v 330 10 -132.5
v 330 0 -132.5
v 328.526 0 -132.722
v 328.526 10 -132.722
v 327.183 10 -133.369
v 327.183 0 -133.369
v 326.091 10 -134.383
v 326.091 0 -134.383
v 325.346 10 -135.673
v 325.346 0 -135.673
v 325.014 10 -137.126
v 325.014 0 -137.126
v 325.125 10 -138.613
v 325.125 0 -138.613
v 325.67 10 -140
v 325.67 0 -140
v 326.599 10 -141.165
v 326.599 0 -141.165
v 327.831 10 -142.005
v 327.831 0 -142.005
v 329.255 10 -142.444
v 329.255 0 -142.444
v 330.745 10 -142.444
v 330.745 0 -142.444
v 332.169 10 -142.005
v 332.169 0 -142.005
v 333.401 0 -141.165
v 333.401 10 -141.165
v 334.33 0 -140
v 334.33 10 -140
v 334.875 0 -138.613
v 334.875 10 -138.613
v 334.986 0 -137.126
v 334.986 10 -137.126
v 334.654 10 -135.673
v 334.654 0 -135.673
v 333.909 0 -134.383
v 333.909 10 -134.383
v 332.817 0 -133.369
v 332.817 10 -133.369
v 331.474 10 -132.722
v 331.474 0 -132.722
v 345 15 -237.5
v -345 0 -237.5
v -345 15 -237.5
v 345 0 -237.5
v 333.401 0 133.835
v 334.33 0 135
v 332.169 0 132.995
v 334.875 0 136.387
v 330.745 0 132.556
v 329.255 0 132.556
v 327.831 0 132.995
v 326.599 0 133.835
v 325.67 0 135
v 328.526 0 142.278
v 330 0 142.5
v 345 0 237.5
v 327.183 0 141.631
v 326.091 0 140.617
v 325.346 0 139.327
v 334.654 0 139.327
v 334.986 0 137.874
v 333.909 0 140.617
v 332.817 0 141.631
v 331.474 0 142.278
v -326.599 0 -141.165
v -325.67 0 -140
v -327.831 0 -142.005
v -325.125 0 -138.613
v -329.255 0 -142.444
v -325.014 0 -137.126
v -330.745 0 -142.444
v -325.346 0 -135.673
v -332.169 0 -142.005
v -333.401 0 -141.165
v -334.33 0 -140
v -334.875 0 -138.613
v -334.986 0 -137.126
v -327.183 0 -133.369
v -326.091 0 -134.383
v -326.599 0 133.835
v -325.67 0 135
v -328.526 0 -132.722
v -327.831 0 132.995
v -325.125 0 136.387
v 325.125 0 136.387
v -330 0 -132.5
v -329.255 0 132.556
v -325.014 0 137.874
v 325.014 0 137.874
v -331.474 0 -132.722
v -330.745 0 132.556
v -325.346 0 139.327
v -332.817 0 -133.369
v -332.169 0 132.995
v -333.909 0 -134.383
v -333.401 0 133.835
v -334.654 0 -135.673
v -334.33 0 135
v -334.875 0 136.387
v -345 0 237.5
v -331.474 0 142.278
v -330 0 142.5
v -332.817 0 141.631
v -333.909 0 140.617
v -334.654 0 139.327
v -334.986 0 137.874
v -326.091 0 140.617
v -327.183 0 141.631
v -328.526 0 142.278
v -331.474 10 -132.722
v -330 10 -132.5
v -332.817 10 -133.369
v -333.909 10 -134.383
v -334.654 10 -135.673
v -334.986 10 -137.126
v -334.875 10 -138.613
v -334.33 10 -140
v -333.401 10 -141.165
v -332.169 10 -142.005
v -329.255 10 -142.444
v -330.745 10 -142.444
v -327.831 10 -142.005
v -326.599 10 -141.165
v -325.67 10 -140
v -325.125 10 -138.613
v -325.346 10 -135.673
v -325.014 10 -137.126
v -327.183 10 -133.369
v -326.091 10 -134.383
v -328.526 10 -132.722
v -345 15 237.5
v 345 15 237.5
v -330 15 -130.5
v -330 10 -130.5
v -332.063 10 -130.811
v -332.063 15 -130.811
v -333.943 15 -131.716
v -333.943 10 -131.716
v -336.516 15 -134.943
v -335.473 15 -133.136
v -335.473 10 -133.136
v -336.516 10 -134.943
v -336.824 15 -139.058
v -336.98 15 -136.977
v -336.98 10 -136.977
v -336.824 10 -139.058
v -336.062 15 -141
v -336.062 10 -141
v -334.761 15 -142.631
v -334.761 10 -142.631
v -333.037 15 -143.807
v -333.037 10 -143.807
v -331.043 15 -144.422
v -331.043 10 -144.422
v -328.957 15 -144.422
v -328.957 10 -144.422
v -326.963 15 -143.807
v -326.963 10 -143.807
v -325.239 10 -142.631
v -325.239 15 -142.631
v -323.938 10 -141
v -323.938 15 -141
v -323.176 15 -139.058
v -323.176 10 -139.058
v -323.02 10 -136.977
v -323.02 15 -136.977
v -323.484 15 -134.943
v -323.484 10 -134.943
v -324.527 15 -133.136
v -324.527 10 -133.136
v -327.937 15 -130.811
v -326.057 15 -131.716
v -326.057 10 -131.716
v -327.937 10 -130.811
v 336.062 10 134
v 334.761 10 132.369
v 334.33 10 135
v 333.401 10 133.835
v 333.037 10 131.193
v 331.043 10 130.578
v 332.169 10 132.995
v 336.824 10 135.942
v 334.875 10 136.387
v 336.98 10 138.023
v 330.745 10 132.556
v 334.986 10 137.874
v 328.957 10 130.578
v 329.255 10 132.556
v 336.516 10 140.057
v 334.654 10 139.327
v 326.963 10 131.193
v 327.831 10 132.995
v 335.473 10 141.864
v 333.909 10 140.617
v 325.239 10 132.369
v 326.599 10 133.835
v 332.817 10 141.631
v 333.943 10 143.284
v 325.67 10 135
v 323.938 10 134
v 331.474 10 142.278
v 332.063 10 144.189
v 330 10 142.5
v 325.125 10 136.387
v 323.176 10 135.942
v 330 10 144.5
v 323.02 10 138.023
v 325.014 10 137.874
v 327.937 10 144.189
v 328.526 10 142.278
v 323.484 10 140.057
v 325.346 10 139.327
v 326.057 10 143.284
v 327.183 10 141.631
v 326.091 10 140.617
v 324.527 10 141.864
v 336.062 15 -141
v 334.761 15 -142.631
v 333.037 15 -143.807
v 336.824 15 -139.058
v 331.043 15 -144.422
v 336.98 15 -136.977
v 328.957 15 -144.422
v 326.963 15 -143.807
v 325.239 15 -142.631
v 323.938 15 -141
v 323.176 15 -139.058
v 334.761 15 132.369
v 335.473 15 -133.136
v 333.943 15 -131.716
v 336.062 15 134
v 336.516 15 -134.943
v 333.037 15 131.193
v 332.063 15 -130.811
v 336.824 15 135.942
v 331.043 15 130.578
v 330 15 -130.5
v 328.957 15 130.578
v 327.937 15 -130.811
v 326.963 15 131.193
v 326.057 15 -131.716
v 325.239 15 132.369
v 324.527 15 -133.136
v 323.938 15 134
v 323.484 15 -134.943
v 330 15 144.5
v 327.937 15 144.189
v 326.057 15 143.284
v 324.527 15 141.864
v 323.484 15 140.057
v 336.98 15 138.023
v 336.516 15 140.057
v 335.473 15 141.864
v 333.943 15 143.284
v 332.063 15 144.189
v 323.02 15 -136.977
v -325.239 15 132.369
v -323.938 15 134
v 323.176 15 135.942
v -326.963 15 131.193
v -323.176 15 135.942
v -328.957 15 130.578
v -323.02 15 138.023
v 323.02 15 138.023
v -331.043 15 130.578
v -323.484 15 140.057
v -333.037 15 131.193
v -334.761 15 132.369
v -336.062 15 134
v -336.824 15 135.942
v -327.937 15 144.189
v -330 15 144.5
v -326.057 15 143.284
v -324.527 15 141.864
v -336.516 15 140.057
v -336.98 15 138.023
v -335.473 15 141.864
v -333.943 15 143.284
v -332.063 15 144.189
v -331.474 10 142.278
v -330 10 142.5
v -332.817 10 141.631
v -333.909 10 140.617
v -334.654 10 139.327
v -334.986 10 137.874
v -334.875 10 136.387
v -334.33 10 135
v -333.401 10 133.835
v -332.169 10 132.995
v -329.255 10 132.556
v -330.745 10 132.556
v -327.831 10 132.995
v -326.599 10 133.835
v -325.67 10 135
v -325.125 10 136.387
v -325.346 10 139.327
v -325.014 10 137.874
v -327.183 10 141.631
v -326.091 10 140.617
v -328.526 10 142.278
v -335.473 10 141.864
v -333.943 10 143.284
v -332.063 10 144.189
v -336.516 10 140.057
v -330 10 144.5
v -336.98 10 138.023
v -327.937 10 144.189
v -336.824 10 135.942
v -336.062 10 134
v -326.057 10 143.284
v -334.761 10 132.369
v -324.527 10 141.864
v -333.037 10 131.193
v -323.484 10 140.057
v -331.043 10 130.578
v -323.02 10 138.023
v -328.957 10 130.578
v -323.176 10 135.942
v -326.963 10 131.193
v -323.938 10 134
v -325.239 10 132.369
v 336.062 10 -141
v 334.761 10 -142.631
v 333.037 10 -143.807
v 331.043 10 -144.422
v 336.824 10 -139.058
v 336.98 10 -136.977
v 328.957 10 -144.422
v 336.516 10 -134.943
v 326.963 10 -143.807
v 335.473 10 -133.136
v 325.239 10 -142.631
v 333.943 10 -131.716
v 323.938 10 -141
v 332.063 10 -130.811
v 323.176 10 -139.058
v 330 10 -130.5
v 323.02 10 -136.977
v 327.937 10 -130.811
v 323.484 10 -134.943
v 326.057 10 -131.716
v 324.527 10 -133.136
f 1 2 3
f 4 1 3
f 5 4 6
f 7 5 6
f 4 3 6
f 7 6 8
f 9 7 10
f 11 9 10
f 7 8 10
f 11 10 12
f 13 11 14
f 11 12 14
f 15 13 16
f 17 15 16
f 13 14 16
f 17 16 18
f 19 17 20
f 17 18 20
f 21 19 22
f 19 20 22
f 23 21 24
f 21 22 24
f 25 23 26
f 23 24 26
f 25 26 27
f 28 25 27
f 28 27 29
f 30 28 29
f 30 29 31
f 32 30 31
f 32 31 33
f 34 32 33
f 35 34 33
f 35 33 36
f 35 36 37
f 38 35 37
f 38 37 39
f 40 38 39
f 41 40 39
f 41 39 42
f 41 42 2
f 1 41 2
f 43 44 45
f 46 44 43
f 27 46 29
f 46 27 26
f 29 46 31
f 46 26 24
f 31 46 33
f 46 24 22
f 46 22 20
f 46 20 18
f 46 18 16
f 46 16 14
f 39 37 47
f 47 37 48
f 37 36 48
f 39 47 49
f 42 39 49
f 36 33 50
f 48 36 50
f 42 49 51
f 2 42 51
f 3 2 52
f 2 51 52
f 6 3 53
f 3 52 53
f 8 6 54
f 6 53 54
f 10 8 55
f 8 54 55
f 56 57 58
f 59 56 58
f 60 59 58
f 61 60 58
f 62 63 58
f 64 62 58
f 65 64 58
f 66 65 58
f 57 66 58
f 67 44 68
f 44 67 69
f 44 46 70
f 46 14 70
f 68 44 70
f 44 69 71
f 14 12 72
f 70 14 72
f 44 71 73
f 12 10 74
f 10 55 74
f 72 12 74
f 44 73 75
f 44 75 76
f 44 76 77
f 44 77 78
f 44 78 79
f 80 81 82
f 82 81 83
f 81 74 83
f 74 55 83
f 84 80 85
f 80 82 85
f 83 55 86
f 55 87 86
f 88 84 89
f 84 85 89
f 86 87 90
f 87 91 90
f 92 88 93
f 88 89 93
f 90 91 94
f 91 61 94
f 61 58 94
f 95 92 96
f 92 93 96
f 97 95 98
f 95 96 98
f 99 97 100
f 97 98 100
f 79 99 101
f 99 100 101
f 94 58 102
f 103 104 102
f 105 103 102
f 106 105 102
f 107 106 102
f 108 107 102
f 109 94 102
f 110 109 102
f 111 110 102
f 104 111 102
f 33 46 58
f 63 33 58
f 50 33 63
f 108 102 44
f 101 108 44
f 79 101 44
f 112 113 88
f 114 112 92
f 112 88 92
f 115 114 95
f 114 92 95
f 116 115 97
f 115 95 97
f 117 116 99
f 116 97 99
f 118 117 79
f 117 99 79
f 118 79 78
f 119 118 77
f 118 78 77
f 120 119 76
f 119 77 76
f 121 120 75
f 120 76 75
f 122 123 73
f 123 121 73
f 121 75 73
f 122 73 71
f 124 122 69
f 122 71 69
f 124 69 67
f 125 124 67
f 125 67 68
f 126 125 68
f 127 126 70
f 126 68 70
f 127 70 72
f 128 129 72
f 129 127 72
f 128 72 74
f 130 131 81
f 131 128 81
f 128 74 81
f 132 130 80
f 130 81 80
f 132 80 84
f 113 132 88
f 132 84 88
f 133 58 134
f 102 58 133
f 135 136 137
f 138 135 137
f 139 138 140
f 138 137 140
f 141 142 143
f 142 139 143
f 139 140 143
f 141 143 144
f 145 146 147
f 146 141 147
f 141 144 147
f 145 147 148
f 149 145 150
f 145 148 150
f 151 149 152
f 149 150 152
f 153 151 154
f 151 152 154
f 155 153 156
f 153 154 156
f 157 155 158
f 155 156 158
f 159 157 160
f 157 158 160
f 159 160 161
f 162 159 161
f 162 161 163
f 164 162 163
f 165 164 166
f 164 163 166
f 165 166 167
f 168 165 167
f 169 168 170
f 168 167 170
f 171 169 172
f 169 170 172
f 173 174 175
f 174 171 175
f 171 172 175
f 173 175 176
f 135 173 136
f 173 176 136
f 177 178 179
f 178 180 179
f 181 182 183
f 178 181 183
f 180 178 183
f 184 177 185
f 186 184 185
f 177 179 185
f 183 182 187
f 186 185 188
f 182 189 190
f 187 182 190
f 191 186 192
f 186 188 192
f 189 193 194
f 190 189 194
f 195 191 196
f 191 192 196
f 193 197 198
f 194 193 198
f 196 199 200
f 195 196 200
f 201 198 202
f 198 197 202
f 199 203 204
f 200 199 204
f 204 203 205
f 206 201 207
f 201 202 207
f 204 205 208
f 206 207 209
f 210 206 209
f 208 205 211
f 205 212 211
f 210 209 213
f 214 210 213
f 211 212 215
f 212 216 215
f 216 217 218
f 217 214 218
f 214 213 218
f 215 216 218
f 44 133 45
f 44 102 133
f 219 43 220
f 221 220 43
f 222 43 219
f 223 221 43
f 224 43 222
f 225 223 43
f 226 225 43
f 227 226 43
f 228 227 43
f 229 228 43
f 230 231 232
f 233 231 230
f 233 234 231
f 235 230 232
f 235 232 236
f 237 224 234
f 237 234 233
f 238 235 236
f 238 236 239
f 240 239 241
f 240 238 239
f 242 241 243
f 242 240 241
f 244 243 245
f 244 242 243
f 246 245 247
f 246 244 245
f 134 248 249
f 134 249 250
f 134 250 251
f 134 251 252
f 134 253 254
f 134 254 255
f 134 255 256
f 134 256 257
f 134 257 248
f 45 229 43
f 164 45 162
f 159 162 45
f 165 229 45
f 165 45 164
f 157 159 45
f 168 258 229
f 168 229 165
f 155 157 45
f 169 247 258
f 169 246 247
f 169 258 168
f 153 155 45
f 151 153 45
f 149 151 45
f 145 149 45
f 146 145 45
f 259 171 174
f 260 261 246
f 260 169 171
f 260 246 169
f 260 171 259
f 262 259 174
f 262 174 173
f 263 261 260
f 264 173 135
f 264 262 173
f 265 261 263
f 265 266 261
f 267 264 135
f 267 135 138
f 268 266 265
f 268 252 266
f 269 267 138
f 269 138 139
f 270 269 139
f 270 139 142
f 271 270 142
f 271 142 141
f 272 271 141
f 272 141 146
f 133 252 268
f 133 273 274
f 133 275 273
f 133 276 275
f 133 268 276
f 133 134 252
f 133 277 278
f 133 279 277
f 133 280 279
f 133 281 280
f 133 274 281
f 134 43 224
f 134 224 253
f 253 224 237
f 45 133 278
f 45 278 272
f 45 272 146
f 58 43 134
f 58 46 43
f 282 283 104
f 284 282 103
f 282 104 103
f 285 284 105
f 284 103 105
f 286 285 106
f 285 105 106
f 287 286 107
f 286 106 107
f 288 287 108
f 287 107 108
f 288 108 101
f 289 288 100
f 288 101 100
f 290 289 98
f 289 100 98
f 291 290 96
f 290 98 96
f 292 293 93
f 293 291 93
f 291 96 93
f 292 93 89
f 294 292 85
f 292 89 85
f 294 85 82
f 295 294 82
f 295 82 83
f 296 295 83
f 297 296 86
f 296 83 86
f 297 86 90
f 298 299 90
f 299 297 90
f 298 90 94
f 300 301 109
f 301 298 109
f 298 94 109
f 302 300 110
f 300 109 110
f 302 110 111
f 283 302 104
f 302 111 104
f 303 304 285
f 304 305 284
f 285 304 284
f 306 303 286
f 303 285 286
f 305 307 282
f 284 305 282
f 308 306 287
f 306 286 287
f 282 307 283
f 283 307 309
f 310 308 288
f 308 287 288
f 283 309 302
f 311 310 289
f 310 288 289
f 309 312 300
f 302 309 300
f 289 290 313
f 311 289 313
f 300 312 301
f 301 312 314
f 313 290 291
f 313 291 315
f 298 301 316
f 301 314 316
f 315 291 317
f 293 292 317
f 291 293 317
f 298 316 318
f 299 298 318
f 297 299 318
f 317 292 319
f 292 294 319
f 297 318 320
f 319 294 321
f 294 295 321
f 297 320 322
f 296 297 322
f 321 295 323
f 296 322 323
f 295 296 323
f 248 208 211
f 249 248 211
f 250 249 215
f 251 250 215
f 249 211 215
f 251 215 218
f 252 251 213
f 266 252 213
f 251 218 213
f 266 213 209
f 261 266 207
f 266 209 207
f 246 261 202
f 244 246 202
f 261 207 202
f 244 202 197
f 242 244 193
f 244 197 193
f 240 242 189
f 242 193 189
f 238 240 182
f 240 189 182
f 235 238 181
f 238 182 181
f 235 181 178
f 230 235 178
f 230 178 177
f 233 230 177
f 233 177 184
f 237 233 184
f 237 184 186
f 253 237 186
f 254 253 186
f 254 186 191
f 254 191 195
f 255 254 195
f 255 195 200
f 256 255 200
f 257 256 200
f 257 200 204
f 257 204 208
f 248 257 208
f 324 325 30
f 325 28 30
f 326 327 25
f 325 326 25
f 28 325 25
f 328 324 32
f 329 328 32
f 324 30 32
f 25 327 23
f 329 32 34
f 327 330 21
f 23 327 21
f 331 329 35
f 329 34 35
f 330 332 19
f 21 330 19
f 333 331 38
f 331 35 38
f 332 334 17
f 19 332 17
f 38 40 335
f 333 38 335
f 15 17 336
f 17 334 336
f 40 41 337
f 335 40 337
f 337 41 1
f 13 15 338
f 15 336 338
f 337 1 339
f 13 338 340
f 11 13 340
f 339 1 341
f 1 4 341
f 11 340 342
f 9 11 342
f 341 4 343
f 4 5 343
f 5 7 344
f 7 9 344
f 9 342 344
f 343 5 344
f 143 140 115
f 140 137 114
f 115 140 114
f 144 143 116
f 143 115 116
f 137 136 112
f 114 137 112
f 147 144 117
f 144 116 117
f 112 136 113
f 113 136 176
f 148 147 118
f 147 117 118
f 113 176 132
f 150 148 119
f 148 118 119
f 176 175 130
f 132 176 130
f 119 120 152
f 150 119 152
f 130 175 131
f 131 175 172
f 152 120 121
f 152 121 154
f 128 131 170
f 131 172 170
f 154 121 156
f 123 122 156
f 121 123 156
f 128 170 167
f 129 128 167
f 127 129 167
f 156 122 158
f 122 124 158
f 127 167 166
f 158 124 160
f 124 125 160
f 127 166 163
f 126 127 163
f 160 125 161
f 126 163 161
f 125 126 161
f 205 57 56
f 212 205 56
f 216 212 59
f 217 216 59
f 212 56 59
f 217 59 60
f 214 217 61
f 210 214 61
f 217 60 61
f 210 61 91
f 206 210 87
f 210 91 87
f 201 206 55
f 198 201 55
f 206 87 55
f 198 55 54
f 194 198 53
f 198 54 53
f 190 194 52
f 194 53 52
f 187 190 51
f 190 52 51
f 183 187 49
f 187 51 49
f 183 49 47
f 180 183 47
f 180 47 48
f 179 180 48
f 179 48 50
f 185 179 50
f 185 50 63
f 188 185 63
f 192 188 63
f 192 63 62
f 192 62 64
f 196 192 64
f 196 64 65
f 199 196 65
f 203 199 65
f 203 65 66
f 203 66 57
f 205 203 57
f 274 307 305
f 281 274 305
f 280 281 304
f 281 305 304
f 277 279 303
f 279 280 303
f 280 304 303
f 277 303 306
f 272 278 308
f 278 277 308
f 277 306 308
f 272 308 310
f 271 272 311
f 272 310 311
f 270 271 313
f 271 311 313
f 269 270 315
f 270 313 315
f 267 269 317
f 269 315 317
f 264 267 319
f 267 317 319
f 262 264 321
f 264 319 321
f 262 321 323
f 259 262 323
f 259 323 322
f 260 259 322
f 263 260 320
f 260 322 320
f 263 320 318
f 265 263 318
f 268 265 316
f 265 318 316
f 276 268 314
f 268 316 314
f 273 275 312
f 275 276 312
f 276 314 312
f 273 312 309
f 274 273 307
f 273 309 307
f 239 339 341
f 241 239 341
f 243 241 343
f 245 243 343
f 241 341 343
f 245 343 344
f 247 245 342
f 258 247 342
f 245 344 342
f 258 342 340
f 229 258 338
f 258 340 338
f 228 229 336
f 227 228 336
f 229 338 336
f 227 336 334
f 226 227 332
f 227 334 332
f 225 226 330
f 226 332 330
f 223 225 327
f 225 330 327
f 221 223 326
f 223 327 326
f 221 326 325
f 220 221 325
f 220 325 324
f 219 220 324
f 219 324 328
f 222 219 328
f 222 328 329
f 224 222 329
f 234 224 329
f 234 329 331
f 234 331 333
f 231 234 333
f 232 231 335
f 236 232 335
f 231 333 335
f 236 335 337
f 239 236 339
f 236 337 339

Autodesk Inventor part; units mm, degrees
ref_plane "YZ Plane" through (0, 0, 0) normal (1, 0, 0) x (0, 1, 0)
ref_plane "XZ Plane" through (0, 0, 0) normal (0, 1, 0) x (-1, 0, 0)
ref_plane "XY Plane" through (0, 0, 0) normal (0, 0, 1) x (1, 0, 0)
sketch "Sketch1" plane through (0, 0, 0) normal (0, 1, 0) x (-1, 0, 0)
  line L0 (345, -237.5) -> (-345, -237.5)
  line L1 (-345, -237.5) -> (-345, 237.5)
  line L2 (-345, 237.5) -> (345, 237.5)
  line L3 (345, 237.5) -> (345, -237.5)
  line L4 (345, -237.5) -> (-345, 237.5) construction
  line L5 (-345, -237.5) -> (345, 237.5) construction
  point P0 (0, 0)
  dimension "d0" = 690
  dimension "d1" = 475
extrude "Plate1" add sketch "Sketch1" along normal blind 15
sketch "Sketch2" plane through (0, 15, 0) normal (0, 1, 0) x (1, 0, 0)
  line L0 (-345, -237.5) -> (-345, 237.5) construction
  line L1 (345, -237.5) -> (-345, -237.5) construction
  line L2 (345, 237.5) -> (345, -237.5) construction
  line L3 (-345, 237.5) -> (345, 237.5) construction
  line L4 (330, -237.5) -> (330, 237.5) construction
  line L5 (345, 0) -> (0, 0) construction
  point P0 (330, -137.5)
  point P1 (330, 137.5)
  dimension "d4" = 330
  dimension "d5" = 275
  dimension "d6" = 100
  dimension "d7" = 100
hole "Hole1" at (330, 15, 137.5) at (330, 15, -137.5) direction (0, -1, 0) diameter 10 end through all counterbore diameter 14 counterbore depth 5
mirror "Mirror1" about plane through (0, 0, 0) normal (1, 0, 0) of "Hole1"
equation "\"d13\" = Thickness"
equation "\"d2\" = Thickness"
equation "\"BendRadius\" = Thickness"
equation "\"BendReliefWidth\" = Thickness"
equation "\"BendReliefDepth\" = 0.5 * Thickness"
equation "\"TransitionRadius\" = BendRadius"
equation "\"JacobiRadiusSize\" = BendRadius"
equation "\"GapSize\" = Thickness"
equation "\"Thickness\" = 15"
properties part number "фанера1" material "Wood (Maple)"
